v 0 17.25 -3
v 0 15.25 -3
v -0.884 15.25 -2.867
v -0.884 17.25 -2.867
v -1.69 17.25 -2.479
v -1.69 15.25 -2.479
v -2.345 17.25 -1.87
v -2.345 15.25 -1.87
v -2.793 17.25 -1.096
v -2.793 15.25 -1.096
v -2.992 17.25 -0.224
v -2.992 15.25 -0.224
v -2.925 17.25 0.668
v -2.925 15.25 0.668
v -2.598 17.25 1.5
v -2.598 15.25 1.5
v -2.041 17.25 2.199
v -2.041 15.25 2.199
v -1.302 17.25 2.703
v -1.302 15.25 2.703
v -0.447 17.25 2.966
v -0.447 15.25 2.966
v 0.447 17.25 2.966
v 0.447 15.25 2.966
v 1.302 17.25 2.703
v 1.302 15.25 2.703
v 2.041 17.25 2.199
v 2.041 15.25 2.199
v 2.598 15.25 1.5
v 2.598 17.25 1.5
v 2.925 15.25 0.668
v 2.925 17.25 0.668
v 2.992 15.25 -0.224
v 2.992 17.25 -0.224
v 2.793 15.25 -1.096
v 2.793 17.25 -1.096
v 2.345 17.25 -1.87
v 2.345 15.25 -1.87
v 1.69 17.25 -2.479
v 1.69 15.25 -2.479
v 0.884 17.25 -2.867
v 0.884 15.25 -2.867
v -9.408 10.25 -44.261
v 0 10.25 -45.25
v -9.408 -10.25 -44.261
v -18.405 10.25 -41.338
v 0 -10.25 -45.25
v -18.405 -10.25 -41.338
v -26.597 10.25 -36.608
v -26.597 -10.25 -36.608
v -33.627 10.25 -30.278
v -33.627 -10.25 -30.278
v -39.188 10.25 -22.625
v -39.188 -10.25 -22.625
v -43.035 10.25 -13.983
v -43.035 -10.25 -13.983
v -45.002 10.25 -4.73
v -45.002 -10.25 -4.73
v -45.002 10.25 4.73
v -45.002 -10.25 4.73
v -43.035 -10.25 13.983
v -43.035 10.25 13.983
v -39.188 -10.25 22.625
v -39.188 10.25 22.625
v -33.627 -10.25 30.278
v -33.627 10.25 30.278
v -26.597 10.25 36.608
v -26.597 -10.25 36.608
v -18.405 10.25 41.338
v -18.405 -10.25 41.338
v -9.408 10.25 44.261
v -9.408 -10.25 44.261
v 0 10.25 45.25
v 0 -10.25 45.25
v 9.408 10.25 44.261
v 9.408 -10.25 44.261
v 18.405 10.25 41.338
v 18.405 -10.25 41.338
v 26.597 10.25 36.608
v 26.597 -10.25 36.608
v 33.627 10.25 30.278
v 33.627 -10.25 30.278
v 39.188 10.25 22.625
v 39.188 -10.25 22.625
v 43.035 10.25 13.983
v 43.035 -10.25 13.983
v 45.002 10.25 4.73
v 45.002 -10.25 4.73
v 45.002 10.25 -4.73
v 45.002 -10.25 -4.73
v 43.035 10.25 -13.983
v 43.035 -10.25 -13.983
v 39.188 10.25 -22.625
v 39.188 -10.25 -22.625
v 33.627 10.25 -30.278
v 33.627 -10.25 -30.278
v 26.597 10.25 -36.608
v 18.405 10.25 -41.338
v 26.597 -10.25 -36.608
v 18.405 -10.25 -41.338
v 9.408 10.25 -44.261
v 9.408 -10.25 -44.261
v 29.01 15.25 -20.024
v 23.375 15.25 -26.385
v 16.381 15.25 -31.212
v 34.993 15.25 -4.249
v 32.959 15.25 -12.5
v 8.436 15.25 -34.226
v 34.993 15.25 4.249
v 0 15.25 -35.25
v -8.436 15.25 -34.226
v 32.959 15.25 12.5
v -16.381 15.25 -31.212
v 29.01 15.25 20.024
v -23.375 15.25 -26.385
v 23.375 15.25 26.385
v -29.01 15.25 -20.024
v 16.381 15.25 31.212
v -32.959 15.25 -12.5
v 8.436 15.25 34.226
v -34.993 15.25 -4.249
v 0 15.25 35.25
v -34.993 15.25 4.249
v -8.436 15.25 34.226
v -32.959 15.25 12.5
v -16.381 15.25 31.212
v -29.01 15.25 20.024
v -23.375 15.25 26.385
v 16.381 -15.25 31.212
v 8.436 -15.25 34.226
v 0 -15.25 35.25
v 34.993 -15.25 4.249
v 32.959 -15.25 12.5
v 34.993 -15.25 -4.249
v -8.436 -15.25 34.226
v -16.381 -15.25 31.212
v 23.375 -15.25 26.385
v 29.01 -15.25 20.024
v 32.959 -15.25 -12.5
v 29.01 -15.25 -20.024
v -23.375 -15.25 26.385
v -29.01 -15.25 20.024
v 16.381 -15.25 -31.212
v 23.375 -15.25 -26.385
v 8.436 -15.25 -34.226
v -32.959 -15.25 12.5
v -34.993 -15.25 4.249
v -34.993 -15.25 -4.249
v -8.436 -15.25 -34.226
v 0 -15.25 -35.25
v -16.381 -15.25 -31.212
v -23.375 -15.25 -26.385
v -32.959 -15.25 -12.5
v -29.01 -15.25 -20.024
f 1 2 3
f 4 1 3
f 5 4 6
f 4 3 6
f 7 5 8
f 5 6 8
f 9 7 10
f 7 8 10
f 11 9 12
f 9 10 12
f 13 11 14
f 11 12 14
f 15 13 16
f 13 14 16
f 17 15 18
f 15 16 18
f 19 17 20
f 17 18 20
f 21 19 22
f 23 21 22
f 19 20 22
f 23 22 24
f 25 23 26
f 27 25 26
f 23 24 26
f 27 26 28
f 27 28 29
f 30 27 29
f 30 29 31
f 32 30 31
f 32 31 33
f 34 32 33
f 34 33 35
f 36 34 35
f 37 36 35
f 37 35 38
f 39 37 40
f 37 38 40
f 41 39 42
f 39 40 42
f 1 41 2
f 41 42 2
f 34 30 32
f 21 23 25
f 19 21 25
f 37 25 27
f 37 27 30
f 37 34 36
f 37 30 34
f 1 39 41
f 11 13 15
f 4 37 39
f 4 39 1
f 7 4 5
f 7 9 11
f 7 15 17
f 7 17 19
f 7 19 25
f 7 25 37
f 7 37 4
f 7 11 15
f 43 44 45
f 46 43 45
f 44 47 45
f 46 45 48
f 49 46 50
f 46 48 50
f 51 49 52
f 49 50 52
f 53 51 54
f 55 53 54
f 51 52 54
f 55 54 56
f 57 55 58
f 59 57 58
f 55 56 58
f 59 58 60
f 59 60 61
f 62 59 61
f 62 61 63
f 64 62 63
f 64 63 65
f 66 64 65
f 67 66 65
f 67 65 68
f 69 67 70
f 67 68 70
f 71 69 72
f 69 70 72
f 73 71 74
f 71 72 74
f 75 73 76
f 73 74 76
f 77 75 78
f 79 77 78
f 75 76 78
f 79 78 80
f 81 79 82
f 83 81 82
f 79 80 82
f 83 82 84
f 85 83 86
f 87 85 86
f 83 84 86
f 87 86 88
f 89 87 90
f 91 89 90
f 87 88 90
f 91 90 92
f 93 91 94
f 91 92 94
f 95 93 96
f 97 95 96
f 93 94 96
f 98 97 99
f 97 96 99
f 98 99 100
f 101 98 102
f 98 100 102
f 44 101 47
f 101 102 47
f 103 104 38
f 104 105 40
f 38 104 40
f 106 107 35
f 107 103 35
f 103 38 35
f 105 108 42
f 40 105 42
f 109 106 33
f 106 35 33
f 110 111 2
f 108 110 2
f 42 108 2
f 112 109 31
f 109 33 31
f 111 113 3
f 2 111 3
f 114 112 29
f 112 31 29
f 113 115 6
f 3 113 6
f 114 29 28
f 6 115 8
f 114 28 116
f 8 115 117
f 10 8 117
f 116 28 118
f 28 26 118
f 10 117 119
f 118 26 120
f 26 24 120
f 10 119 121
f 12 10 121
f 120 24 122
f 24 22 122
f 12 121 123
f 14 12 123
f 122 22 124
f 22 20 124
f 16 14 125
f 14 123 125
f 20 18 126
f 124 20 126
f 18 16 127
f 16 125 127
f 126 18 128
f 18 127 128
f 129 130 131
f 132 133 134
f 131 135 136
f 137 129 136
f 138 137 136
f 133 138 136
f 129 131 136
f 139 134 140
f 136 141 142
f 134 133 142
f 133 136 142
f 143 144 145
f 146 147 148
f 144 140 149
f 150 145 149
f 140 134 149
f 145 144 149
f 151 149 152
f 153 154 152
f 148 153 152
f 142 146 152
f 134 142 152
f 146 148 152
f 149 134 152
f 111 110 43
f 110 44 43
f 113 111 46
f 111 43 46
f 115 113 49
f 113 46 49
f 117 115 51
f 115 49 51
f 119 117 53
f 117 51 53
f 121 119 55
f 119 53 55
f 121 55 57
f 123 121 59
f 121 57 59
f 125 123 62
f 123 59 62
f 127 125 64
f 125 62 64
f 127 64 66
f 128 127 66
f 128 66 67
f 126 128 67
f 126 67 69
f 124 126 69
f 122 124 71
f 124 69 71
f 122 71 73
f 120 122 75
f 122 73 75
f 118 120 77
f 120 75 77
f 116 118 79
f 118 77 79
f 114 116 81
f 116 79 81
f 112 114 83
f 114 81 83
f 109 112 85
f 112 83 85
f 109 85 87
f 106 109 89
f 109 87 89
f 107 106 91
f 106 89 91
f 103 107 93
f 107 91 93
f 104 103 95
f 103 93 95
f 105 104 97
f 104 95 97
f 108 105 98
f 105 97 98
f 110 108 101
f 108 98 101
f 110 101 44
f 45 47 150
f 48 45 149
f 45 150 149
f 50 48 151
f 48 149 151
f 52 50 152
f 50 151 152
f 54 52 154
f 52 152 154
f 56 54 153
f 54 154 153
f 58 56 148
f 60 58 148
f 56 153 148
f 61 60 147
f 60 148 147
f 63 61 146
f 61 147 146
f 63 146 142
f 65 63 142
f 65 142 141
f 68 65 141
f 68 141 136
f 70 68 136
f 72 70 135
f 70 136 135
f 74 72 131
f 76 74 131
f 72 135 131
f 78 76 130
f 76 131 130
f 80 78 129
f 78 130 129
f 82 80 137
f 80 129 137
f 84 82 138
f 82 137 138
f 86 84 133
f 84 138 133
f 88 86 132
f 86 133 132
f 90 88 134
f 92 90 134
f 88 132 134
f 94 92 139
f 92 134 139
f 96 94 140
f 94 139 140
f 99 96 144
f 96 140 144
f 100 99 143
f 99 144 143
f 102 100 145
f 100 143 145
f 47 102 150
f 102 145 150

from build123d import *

# Parameters (mm, degrees)
ESQUISSE2_R        = 3
BOSS_EXTRU_1_DEPTH = 2


with BuildPart() as part:
    # Esquisse1 → Révolution1 (revolve)
    with BuildSketch(Plane.XY, mode=Mode.PRIVATE) as r_volution1_sk:
        Polygon((0, 15.25), (-35.25, 15.25), (-45.25, 10.25), (-45.25, -10.25), (-35.25, -15.25), (0, -15.25), align=None)
    revolve(r_volution1_sk.sketch.rotate(Axis((0, -78.381633957, 0), (0, 1, 0)), 270), axis=Axis((0, -78.381633957, 0), (0, 1, 0)))

    # Esquisse2 → Boss.-Extru.1 (add)
    with BuildSketch(Plane(origin=(0, 15.25, 0), x_dir=(1, 0, 0), z_dir=(0, 1, 0))):
        with Locations(Location((0, 0, 0), (0, 0, 90))):
            Circle(ESQUISSE2_R)
    extrude(amount=BOSS_EXTRU_1_DEPTH)


solid = part.part
